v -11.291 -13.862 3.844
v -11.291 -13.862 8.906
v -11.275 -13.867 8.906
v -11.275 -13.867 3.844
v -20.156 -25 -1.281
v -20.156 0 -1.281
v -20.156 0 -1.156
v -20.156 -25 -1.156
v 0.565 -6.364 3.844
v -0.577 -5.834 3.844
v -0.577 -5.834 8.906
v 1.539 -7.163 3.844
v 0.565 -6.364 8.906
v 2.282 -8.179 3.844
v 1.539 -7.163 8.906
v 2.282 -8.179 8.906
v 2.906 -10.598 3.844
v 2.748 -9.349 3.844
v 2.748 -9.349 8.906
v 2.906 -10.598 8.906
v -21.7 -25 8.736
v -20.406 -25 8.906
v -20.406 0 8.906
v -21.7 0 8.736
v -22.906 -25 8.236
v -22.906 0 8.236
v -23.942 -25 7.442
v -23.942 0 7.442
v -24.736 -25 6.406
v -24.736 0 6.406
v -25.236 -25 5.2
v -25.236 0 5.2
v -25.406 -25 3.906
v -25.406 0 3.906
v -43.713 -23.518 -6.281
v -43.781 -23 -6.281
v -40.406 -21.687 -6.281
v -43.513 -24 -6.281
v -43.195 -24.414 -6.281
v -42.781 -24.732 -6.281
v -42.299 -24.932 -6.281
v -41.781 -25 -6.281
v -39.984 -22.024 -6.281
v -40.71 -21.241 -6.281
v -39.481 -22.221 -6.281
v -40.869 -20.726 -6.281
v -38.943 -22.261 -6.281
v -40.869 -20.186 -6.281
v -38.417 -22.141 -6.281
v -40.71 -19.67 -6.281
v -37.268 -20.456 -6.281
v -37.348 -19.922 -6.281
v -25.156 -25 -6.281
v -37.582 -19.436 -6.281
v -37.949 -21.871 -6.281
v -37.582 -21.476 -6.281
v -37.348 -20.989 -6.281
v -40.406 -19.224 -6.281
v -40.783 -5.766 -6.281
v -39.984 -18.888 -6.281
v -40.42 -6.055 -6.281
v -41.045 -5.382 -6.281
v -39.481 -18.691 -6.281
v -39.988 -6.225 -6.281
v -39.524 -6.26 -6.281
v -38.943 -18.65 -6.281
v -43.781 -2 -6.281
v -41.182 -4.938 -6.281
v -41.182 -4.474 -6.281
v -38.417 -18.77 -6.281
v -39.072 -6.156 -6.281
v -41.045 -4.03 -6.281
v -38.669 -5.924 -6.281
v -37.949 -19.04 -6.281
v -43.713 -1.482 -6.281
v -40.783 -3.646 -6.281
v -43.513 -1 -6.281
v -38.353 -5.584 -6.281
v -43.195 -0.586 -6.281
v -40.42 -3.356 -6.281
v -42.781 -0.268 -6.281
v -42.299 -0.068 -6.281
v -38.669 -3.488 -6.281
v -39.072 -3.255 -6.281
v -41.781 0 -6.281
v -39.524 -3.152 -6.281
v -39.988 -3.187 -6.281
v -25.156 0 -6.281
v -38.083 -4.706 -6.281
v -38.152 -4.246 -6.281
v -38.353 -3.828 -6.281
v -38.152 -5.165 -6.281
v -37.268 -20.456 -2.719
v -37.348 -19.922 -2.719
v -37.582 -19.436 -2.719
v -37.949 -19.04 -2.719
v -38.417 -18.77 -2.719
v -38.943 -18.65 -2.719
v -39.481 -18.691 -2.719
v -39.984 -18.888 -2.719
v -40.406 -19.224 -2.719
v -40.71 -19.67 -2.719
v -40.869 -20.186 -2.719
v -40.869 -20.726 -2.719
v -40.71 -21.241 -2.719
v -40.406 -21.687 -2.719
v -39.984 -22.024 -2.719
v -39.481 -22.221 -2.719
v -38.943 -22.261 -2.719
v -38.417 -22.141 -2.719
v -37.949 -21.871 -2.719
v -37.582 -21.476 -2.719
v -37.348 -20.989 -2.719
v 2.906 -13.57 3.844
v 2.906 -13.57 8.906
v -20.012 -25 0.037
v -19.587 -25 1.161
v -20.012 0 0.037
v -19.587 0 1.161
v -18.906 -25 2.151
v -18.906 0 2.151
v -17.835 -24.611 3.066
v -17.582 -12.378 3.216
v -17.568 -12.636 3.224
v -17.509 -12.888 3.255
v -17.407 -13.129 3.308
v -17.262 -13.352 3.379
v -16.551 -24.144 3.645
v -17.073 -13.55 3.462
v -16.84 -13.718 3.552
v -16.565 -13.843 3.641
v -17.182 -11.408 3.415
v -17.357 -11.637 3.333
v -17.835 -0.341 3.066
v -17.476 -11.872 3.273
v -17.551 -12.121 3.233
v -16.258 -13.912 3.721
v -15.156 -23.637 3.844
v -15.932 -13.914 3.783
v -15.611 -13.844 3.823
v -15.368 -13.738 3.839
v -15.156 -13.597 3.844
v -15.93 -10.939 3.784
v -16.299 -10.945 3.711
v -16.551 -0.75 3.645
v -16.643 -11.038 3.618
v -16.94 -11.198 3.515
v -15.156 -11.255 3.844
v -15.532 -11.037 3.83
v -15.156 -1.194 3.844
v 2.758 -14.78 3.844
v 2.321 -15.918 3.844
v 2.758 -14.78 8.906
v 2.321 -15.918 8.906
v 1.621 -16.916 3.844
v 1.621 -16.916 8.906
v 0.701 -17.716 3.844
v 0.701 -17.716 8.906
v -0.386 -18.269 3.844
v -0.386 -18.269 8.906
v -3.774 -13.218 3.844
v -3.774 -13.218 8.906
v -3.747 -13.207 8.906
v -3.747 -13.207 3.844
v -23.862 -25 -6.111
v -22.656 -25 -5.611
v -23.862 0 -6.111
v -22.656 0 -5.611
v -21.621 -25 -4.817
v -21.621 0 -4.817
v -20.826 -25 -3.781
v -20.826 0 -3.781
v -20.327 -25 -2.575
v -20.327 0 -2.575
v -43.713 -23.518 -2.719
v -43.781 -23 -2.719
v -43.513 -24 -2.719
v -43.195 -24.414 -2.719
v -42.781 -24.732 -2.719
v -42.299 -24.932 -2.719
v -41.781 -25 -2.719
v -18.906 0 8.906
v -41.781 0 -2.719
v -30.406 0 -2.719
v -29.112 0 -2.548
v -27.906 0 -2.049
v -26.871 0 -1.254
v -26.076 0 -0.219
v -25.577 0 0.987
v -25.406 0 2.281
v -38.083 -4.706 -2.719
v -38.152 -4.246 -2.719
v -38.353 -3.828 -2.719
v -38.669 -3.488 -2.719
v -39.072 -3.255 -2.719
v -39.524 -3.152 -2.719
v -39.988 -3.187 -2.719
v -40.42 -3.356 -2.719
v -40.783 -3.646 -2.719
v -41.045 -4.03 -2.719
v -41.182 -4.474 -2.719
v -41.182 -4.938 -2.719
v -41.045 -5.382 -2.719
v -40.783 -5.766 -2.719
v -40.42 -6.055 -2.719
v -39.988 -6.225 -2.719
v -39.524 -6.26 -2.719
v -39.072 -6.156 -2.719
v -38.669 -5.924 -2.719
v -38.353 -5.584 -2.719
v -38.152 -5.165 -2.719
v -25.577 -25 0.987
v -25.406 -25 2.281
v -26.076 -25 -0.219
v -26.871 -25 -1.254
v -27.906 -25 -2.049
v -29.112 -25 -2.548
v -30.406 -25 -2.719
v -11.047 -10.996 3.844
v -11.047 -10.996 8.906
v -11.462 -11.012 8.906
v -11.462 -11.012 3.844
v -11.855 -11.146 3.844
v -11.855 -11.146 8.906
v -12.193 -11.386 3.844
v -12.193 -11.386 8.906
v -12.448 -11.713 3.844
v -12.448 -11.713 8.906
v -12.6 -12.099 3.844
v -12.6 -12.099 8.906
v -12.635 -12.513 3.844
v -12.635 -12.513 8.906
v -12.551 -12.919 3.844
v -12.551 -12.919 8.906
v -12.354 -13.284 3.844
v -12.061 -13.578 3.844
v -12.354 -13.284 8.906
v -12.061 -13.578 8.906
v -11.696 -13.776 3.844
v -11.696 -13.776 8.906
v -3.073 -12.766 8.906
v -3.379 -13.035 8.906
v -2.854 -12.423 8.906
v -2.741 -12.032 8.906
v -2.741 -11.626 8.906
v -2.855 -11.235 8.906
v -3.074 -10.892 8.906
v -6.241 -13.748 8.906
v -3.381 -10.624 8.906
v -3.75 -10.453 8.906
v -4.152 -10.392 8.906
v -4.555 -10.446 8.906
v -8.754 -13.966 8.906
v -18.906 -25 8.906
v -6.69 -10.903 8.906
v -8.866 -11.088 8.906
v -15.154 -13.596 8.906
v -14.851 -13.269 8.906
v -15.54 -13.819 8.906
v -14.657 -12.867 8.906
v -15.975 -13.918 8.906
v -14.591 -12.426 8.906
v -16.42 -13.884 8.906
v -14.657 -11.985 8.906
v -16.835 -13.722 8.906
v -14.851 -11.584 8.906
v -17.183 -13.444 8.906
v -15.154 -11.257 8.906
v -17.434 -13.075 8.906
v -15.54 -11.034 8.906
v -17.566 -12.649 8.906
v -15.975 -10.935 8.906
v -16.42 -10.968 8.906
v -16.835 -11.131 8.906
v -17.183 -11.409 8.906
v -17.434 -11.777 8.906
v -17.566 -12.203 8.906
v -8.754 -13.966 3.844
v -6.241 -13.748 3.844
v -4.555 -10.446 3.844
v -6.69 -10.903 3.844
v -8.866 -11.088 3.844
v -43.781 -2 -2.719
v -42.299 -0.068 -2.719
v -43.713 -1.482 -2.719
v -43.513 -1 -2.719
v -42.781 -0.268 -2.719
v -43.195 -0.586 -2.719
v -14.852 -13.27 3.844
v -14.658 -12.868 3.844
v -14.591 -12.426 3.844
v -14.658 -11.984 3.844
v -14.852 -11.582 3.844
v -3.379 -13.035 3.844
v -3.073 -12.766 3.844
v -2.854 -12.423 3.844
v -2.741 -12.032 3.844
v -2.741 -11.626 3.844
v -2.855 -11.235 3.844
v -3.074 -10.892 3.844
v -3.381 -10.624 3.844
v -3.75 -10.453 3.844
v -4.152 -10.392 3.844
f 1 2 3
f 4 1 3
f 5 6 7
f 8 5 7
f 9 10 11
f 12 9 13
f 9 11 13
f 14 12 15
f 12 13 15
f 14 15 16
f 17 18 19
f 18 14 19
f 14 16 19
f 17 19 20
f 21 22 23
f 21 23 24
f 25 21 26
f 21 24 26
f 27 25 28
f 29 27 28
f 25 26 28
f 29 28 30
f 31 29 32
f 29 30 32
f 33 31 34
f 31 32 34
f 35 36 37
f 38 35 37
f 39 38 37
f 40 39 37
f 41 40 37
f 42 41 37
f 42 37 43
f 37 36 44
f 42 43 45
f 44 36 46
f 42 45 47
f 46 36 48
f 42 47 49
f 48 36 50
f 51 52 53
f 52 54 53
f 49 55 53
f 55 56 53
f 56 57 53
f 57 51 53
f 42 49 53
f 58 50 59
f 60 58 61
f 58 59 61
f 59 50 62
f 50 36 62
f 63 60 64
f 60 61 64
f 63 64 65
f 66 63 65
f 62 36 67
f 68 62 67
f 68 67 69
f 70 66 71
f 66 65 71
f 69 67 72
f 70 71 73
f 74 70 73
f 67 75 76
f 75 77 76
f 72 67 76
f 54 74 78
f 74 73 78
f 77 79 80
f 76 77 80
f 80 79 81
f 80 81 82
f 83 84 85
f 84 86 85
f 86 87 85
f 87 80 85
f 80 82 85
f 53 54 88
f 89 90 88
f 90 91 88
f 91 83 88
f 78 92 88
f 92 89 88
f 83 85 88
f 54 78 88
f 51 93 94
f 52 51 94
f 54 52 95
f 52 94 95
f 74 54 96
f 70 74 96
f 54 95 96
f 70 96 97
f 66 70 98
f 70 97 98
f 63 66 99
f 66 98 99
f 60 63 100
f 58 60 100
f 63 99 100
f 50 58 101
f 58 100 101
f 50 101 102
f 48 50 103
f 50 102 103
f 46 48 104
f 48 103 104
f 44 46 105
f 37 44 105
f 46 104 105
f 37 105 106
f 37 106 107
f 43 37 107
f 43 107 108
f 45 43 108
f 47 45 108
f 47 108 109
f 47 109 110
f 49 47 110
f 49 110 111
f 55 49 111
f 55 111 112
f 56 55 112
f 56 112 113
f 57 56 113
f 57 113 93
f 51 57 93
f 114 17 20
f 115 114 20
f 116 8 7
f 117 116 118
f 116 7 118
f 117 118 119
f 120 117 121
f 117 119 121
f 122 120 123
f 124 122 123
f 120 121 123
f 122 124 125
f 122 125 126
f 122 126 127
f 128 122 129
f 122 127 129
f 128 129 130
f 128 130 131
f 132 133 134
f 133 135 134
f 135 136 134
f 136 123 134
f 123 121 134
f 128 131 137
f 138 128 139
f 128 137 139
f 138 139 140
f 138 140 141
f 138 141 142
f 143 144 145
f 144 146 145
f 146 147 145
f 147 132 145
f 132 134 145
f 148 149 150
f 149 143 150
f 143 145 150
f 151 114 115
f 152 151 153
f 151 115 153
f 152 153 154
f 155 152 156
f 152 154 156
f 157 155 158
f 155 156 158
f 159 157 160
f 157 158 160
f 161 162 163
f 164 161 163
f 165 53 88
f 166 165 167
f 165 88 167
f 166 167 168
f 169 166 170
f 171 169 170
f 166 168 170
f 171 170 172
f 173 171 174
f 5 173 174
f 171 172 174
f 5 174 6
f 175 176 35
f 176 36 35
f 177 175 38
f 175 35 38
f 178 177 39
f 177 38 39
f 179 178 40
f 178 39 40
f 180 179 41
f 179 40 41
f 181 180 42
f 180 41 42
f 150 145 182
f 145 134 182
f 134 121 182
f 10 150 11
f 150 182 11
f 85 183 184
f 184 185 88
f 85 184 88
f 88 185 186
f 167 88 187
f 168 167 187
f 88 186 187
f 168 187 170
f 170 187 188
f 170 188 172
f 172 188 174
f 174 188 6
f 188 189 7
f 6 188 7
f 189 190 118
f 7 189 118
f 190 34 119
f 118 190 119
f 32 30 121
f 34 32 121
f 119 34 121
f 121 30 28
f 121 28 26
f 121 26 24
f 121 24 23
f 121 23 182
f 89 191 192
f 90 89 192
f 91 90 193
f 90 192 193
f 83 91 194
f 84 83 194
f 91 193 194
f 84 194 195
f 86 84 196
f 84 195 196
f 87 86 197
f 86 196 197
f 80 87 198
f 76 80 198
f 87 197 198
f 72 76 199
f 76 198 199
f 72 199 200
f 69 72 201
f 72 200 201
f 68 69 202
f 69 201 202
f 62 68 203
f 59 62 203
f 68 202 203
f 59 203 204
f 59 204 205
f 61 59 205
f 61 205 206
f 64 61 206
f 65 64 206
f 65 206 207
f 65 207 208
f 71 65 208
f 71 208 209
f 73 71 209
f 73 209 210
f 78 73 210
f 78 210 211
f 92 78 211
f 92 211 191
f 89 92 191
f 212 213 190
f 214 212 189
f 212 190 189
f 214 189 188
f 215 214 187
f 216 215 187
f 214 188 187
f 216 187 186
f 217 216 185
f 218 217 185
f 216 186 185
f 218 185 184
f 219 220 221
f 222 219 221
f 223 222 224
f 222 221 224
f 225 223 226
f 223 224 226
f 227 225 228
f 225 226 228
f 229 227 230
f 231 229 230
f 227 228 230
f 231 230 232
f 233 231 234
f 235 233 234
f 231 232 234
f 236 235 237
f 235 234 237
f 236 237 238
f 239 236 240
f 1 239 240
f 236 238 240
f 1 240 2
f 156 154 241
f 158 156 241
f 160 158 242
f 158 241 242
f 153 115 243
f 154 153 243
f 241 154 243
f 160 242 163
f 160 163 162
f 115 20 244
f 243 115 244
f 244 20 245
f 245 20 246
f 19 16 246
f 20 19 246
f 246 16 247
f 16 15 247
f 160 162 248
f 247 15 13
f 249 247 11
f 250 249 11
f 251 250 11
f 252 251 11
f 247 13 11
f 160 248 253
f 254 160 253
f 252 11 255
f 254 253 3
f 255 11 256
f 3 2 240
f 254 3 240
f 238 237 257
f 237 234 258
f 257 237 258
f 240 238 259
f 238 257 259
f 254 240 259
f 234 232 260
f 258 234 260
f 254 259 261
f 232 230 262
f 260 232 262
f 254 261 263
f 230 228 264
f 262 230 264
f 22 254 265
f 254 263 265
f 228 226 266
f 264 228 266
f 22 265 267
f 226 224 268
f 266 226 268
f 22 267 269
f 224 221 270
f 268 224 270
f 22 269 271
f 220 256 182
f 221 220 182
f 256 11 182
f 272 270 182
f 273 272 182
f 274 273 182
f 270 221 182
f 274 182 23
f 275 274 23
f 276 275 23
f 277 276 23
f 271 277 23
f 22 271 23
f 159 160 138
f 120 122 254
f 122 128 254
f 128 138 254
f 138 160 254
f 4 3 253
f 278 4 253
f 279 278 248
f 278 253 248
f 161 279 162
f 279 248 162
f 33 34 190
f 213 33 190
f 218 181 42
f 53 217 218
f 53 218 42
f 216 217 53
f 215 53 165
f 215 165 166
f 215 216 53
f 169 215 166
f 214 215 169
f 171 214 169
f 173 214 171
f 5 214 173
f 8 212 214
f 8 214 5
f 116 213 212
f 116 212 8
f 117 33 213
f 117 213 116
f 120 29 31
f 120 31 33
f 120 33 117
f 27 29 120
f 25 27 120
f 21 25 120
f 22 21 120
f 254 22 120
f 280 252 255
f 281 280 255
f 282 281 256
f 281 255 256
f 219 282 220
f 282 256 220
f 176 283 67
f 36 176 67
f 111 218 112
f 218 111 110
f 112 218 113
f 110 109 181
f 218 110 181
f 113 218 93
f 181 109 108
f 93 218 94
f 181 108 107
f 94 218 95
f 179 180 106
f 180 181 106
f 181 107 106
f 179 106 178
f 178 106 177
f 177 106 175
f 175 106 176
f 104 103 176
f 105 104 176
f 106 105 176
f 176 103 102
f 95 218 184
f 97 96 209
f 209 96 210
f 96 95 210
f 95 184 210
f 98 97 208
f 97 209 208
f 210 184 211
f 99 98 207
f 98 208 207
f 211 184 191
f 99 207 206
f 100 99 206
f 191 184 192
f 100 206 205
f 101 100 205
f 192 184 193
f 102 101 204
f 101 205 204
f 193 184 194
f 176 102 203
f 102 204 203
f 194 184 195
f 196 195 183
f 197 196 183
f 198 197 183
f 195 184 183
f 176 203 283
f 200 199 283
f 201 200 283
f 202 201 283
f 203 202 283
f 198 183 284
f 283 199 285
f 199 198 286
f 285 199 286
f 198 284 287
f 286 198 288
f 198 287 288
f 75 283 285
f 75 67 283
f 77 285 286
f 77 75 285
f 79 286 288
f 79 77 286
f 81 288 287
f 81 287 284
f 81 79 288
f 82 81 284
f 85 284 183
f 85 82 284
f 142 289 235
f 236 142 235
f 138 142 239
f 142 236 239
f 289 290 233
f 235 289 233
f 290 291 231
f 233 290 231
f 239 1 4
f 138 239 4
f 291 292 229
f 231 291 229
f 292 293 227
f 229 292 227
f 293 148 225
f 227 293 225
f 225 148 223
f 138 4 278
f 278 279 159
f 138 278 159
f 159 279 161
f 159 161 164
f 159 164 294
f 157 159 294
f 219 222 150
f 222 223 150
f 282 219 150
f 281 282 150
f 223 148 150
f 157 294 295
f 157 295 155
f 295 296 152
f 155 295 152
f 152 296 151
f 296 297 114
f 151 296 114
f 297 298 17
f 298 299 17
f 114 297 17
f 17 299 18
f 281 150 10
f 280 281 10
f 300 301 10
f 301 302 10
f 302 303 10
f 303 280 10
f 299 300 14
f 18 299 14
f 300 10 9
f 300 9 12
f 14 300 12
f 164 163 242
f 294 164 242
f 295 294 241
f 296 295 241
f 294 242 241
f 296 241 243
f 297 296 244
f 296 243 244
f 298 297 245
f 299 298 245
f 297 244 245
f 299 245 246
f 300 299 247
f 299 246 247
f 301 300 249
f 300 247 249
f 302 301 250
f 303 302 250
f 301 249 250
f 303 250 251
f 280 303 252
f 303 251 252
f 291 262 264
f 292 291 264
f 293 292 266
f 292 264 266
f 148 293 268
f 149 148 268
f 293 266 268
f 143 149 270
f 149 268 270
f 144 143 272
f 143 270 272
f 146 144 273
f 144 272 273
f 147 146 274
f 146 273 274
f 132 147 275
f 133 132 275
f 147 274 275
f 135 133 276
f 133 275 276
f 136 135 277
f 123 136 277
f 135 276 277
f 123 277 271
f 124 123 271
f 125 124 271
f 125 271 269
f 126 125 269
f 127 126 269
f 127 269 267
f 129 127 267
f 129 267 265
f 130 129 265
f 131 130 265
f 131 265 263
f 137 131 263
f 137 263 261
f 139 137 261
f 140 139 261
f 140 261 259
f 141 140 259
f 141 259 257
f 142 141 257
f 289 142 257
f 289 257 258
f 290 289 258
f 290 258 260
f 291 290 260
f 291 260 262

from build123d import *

# Parameters (mm, degrees)
F1_DEPTH = 25
F2_R     = 1.558197
F2_R_2   = 1.810611
F3_DEPTH = 25
F4_R     = 1.495771
F5_DEPTH = 25
F6_R     = 2


with BuildPart() as f1:
    # F0 (on Front) → F1 (new body)
    with BuildSketch(Plane.XZ):
        with BuildLine():
            Line((-43.781251, -2.71875), (-43.781251, -6.281251))
            Line((-43.781251, -6.281251), (-25.156251, -6.281251))
            ThreePointArc((-25.156251, -6.281251), (-21.620717, -4.816785), (-20.156251, -1.281251))
            Line((-20.156251, -1.281251), (-20.156251, -1.15625))
            ThreePointArc((-20.156251, -1.15625), (-18.691785, 2.379284), (-15.156251, 3.84375))
            Line((-15.156251, 3.84375), (2.906251, 3.84375))
            Line((2.906251, 3.84375), (2.906251, 8.906251))
            Line((2.906251, 8.906251), (-20.406251, 8.906251))
            ThreePointArc((-20.406251, 8.906251), (-23.941785, 7.441785), (-25.406251, 3.906251))
            Line((-25.406251, 3.906251), (-25.406251, 2.28125))
            ThreePointArc((-25.406251, 2.28125), (-26.870717, -1.254284), (-30.406251, -2.71875))
            Line((-30.406251, -2.71875), (-43.781251, -2.71875))
        make_face()
    extrude(amount=F1_DEPTH)

    # F2 (on face) → F3 (cut)
    with BuildSketch(Plane.XY.offset(-2.71875)):
        with Locations((-39.640795, -4.70578)):
            Circle(F2_R)
        with Locations((-39.078295, -20.455781)):
            Circle(F2_R_2)
    extrude(amount=-F3_DEPTH, mode=Mode.SUBTRACT)

    # F4 (on face) → F5 (cut)
    with BuildSketch(Plane.XY.offset(8.906251)):
        with BuildLine():
            ThreePointArc((-0.577267, -5.833911), (1.942488, -7.647325), (2.906251, -10.598393))
            Line((2.906251, -10.598393), (2.906251, 0))
            Line((2.906251, 0), (-18.906251, 0))
            Line((-18.906251, 0), (-0.577267, -5.833911))
        make_face()
        with BuildLine():
            Line((2.906251, -25), (2.906251, -13.569611))
            ThreePointArc((2.906251, -13.569611), (2.001345, -16.438445), (-0.385832, -18.268869))
            Line((-0.385832, -18.268869), (-18.906251, -25))
            Line((-18.906251, -25), (2.906251, -25))
        make_face()
        with Locations((-16.0868, -12.426148)):
            Circle(F4_R)
        with BuildLine():
            ThreePointArc((-4.555258, -10.445567), (-7.775122, -11.030102), (-11.047432, -10.995579))
            ThreePointArc((-11.047432, -10.995579), (-12.632527, -12.304577), (-11.29052, -13.861825))
            Line((-11.29052, -13.861825), (-11.275081, -13.867438))
            ThreePointArc((-11.275081, -13.867438), (-7.493954, -13.896562), (-3.774169, -13.217624))
            Line((-3.774169, -13.217624), (-3.747407, -13.206846))
            ThreePointArc((-3.747407, -13.206846), (-2.784389, -11.426288), (-4.555258, -10.445567))
        make_face()
    extrude(amount=-F5_DEPTH, mode=Mode.SUBTRACT)

    # F6
    f6_edges = [f1.edges().sort_by_distance(p)[0] for p in [
        (-43.781251, 0, -4.5),
        (-43.781251, -25, -4.5),
    ]]
    fillet(f6_edges, radius=F6_R)


solid = f1.part
